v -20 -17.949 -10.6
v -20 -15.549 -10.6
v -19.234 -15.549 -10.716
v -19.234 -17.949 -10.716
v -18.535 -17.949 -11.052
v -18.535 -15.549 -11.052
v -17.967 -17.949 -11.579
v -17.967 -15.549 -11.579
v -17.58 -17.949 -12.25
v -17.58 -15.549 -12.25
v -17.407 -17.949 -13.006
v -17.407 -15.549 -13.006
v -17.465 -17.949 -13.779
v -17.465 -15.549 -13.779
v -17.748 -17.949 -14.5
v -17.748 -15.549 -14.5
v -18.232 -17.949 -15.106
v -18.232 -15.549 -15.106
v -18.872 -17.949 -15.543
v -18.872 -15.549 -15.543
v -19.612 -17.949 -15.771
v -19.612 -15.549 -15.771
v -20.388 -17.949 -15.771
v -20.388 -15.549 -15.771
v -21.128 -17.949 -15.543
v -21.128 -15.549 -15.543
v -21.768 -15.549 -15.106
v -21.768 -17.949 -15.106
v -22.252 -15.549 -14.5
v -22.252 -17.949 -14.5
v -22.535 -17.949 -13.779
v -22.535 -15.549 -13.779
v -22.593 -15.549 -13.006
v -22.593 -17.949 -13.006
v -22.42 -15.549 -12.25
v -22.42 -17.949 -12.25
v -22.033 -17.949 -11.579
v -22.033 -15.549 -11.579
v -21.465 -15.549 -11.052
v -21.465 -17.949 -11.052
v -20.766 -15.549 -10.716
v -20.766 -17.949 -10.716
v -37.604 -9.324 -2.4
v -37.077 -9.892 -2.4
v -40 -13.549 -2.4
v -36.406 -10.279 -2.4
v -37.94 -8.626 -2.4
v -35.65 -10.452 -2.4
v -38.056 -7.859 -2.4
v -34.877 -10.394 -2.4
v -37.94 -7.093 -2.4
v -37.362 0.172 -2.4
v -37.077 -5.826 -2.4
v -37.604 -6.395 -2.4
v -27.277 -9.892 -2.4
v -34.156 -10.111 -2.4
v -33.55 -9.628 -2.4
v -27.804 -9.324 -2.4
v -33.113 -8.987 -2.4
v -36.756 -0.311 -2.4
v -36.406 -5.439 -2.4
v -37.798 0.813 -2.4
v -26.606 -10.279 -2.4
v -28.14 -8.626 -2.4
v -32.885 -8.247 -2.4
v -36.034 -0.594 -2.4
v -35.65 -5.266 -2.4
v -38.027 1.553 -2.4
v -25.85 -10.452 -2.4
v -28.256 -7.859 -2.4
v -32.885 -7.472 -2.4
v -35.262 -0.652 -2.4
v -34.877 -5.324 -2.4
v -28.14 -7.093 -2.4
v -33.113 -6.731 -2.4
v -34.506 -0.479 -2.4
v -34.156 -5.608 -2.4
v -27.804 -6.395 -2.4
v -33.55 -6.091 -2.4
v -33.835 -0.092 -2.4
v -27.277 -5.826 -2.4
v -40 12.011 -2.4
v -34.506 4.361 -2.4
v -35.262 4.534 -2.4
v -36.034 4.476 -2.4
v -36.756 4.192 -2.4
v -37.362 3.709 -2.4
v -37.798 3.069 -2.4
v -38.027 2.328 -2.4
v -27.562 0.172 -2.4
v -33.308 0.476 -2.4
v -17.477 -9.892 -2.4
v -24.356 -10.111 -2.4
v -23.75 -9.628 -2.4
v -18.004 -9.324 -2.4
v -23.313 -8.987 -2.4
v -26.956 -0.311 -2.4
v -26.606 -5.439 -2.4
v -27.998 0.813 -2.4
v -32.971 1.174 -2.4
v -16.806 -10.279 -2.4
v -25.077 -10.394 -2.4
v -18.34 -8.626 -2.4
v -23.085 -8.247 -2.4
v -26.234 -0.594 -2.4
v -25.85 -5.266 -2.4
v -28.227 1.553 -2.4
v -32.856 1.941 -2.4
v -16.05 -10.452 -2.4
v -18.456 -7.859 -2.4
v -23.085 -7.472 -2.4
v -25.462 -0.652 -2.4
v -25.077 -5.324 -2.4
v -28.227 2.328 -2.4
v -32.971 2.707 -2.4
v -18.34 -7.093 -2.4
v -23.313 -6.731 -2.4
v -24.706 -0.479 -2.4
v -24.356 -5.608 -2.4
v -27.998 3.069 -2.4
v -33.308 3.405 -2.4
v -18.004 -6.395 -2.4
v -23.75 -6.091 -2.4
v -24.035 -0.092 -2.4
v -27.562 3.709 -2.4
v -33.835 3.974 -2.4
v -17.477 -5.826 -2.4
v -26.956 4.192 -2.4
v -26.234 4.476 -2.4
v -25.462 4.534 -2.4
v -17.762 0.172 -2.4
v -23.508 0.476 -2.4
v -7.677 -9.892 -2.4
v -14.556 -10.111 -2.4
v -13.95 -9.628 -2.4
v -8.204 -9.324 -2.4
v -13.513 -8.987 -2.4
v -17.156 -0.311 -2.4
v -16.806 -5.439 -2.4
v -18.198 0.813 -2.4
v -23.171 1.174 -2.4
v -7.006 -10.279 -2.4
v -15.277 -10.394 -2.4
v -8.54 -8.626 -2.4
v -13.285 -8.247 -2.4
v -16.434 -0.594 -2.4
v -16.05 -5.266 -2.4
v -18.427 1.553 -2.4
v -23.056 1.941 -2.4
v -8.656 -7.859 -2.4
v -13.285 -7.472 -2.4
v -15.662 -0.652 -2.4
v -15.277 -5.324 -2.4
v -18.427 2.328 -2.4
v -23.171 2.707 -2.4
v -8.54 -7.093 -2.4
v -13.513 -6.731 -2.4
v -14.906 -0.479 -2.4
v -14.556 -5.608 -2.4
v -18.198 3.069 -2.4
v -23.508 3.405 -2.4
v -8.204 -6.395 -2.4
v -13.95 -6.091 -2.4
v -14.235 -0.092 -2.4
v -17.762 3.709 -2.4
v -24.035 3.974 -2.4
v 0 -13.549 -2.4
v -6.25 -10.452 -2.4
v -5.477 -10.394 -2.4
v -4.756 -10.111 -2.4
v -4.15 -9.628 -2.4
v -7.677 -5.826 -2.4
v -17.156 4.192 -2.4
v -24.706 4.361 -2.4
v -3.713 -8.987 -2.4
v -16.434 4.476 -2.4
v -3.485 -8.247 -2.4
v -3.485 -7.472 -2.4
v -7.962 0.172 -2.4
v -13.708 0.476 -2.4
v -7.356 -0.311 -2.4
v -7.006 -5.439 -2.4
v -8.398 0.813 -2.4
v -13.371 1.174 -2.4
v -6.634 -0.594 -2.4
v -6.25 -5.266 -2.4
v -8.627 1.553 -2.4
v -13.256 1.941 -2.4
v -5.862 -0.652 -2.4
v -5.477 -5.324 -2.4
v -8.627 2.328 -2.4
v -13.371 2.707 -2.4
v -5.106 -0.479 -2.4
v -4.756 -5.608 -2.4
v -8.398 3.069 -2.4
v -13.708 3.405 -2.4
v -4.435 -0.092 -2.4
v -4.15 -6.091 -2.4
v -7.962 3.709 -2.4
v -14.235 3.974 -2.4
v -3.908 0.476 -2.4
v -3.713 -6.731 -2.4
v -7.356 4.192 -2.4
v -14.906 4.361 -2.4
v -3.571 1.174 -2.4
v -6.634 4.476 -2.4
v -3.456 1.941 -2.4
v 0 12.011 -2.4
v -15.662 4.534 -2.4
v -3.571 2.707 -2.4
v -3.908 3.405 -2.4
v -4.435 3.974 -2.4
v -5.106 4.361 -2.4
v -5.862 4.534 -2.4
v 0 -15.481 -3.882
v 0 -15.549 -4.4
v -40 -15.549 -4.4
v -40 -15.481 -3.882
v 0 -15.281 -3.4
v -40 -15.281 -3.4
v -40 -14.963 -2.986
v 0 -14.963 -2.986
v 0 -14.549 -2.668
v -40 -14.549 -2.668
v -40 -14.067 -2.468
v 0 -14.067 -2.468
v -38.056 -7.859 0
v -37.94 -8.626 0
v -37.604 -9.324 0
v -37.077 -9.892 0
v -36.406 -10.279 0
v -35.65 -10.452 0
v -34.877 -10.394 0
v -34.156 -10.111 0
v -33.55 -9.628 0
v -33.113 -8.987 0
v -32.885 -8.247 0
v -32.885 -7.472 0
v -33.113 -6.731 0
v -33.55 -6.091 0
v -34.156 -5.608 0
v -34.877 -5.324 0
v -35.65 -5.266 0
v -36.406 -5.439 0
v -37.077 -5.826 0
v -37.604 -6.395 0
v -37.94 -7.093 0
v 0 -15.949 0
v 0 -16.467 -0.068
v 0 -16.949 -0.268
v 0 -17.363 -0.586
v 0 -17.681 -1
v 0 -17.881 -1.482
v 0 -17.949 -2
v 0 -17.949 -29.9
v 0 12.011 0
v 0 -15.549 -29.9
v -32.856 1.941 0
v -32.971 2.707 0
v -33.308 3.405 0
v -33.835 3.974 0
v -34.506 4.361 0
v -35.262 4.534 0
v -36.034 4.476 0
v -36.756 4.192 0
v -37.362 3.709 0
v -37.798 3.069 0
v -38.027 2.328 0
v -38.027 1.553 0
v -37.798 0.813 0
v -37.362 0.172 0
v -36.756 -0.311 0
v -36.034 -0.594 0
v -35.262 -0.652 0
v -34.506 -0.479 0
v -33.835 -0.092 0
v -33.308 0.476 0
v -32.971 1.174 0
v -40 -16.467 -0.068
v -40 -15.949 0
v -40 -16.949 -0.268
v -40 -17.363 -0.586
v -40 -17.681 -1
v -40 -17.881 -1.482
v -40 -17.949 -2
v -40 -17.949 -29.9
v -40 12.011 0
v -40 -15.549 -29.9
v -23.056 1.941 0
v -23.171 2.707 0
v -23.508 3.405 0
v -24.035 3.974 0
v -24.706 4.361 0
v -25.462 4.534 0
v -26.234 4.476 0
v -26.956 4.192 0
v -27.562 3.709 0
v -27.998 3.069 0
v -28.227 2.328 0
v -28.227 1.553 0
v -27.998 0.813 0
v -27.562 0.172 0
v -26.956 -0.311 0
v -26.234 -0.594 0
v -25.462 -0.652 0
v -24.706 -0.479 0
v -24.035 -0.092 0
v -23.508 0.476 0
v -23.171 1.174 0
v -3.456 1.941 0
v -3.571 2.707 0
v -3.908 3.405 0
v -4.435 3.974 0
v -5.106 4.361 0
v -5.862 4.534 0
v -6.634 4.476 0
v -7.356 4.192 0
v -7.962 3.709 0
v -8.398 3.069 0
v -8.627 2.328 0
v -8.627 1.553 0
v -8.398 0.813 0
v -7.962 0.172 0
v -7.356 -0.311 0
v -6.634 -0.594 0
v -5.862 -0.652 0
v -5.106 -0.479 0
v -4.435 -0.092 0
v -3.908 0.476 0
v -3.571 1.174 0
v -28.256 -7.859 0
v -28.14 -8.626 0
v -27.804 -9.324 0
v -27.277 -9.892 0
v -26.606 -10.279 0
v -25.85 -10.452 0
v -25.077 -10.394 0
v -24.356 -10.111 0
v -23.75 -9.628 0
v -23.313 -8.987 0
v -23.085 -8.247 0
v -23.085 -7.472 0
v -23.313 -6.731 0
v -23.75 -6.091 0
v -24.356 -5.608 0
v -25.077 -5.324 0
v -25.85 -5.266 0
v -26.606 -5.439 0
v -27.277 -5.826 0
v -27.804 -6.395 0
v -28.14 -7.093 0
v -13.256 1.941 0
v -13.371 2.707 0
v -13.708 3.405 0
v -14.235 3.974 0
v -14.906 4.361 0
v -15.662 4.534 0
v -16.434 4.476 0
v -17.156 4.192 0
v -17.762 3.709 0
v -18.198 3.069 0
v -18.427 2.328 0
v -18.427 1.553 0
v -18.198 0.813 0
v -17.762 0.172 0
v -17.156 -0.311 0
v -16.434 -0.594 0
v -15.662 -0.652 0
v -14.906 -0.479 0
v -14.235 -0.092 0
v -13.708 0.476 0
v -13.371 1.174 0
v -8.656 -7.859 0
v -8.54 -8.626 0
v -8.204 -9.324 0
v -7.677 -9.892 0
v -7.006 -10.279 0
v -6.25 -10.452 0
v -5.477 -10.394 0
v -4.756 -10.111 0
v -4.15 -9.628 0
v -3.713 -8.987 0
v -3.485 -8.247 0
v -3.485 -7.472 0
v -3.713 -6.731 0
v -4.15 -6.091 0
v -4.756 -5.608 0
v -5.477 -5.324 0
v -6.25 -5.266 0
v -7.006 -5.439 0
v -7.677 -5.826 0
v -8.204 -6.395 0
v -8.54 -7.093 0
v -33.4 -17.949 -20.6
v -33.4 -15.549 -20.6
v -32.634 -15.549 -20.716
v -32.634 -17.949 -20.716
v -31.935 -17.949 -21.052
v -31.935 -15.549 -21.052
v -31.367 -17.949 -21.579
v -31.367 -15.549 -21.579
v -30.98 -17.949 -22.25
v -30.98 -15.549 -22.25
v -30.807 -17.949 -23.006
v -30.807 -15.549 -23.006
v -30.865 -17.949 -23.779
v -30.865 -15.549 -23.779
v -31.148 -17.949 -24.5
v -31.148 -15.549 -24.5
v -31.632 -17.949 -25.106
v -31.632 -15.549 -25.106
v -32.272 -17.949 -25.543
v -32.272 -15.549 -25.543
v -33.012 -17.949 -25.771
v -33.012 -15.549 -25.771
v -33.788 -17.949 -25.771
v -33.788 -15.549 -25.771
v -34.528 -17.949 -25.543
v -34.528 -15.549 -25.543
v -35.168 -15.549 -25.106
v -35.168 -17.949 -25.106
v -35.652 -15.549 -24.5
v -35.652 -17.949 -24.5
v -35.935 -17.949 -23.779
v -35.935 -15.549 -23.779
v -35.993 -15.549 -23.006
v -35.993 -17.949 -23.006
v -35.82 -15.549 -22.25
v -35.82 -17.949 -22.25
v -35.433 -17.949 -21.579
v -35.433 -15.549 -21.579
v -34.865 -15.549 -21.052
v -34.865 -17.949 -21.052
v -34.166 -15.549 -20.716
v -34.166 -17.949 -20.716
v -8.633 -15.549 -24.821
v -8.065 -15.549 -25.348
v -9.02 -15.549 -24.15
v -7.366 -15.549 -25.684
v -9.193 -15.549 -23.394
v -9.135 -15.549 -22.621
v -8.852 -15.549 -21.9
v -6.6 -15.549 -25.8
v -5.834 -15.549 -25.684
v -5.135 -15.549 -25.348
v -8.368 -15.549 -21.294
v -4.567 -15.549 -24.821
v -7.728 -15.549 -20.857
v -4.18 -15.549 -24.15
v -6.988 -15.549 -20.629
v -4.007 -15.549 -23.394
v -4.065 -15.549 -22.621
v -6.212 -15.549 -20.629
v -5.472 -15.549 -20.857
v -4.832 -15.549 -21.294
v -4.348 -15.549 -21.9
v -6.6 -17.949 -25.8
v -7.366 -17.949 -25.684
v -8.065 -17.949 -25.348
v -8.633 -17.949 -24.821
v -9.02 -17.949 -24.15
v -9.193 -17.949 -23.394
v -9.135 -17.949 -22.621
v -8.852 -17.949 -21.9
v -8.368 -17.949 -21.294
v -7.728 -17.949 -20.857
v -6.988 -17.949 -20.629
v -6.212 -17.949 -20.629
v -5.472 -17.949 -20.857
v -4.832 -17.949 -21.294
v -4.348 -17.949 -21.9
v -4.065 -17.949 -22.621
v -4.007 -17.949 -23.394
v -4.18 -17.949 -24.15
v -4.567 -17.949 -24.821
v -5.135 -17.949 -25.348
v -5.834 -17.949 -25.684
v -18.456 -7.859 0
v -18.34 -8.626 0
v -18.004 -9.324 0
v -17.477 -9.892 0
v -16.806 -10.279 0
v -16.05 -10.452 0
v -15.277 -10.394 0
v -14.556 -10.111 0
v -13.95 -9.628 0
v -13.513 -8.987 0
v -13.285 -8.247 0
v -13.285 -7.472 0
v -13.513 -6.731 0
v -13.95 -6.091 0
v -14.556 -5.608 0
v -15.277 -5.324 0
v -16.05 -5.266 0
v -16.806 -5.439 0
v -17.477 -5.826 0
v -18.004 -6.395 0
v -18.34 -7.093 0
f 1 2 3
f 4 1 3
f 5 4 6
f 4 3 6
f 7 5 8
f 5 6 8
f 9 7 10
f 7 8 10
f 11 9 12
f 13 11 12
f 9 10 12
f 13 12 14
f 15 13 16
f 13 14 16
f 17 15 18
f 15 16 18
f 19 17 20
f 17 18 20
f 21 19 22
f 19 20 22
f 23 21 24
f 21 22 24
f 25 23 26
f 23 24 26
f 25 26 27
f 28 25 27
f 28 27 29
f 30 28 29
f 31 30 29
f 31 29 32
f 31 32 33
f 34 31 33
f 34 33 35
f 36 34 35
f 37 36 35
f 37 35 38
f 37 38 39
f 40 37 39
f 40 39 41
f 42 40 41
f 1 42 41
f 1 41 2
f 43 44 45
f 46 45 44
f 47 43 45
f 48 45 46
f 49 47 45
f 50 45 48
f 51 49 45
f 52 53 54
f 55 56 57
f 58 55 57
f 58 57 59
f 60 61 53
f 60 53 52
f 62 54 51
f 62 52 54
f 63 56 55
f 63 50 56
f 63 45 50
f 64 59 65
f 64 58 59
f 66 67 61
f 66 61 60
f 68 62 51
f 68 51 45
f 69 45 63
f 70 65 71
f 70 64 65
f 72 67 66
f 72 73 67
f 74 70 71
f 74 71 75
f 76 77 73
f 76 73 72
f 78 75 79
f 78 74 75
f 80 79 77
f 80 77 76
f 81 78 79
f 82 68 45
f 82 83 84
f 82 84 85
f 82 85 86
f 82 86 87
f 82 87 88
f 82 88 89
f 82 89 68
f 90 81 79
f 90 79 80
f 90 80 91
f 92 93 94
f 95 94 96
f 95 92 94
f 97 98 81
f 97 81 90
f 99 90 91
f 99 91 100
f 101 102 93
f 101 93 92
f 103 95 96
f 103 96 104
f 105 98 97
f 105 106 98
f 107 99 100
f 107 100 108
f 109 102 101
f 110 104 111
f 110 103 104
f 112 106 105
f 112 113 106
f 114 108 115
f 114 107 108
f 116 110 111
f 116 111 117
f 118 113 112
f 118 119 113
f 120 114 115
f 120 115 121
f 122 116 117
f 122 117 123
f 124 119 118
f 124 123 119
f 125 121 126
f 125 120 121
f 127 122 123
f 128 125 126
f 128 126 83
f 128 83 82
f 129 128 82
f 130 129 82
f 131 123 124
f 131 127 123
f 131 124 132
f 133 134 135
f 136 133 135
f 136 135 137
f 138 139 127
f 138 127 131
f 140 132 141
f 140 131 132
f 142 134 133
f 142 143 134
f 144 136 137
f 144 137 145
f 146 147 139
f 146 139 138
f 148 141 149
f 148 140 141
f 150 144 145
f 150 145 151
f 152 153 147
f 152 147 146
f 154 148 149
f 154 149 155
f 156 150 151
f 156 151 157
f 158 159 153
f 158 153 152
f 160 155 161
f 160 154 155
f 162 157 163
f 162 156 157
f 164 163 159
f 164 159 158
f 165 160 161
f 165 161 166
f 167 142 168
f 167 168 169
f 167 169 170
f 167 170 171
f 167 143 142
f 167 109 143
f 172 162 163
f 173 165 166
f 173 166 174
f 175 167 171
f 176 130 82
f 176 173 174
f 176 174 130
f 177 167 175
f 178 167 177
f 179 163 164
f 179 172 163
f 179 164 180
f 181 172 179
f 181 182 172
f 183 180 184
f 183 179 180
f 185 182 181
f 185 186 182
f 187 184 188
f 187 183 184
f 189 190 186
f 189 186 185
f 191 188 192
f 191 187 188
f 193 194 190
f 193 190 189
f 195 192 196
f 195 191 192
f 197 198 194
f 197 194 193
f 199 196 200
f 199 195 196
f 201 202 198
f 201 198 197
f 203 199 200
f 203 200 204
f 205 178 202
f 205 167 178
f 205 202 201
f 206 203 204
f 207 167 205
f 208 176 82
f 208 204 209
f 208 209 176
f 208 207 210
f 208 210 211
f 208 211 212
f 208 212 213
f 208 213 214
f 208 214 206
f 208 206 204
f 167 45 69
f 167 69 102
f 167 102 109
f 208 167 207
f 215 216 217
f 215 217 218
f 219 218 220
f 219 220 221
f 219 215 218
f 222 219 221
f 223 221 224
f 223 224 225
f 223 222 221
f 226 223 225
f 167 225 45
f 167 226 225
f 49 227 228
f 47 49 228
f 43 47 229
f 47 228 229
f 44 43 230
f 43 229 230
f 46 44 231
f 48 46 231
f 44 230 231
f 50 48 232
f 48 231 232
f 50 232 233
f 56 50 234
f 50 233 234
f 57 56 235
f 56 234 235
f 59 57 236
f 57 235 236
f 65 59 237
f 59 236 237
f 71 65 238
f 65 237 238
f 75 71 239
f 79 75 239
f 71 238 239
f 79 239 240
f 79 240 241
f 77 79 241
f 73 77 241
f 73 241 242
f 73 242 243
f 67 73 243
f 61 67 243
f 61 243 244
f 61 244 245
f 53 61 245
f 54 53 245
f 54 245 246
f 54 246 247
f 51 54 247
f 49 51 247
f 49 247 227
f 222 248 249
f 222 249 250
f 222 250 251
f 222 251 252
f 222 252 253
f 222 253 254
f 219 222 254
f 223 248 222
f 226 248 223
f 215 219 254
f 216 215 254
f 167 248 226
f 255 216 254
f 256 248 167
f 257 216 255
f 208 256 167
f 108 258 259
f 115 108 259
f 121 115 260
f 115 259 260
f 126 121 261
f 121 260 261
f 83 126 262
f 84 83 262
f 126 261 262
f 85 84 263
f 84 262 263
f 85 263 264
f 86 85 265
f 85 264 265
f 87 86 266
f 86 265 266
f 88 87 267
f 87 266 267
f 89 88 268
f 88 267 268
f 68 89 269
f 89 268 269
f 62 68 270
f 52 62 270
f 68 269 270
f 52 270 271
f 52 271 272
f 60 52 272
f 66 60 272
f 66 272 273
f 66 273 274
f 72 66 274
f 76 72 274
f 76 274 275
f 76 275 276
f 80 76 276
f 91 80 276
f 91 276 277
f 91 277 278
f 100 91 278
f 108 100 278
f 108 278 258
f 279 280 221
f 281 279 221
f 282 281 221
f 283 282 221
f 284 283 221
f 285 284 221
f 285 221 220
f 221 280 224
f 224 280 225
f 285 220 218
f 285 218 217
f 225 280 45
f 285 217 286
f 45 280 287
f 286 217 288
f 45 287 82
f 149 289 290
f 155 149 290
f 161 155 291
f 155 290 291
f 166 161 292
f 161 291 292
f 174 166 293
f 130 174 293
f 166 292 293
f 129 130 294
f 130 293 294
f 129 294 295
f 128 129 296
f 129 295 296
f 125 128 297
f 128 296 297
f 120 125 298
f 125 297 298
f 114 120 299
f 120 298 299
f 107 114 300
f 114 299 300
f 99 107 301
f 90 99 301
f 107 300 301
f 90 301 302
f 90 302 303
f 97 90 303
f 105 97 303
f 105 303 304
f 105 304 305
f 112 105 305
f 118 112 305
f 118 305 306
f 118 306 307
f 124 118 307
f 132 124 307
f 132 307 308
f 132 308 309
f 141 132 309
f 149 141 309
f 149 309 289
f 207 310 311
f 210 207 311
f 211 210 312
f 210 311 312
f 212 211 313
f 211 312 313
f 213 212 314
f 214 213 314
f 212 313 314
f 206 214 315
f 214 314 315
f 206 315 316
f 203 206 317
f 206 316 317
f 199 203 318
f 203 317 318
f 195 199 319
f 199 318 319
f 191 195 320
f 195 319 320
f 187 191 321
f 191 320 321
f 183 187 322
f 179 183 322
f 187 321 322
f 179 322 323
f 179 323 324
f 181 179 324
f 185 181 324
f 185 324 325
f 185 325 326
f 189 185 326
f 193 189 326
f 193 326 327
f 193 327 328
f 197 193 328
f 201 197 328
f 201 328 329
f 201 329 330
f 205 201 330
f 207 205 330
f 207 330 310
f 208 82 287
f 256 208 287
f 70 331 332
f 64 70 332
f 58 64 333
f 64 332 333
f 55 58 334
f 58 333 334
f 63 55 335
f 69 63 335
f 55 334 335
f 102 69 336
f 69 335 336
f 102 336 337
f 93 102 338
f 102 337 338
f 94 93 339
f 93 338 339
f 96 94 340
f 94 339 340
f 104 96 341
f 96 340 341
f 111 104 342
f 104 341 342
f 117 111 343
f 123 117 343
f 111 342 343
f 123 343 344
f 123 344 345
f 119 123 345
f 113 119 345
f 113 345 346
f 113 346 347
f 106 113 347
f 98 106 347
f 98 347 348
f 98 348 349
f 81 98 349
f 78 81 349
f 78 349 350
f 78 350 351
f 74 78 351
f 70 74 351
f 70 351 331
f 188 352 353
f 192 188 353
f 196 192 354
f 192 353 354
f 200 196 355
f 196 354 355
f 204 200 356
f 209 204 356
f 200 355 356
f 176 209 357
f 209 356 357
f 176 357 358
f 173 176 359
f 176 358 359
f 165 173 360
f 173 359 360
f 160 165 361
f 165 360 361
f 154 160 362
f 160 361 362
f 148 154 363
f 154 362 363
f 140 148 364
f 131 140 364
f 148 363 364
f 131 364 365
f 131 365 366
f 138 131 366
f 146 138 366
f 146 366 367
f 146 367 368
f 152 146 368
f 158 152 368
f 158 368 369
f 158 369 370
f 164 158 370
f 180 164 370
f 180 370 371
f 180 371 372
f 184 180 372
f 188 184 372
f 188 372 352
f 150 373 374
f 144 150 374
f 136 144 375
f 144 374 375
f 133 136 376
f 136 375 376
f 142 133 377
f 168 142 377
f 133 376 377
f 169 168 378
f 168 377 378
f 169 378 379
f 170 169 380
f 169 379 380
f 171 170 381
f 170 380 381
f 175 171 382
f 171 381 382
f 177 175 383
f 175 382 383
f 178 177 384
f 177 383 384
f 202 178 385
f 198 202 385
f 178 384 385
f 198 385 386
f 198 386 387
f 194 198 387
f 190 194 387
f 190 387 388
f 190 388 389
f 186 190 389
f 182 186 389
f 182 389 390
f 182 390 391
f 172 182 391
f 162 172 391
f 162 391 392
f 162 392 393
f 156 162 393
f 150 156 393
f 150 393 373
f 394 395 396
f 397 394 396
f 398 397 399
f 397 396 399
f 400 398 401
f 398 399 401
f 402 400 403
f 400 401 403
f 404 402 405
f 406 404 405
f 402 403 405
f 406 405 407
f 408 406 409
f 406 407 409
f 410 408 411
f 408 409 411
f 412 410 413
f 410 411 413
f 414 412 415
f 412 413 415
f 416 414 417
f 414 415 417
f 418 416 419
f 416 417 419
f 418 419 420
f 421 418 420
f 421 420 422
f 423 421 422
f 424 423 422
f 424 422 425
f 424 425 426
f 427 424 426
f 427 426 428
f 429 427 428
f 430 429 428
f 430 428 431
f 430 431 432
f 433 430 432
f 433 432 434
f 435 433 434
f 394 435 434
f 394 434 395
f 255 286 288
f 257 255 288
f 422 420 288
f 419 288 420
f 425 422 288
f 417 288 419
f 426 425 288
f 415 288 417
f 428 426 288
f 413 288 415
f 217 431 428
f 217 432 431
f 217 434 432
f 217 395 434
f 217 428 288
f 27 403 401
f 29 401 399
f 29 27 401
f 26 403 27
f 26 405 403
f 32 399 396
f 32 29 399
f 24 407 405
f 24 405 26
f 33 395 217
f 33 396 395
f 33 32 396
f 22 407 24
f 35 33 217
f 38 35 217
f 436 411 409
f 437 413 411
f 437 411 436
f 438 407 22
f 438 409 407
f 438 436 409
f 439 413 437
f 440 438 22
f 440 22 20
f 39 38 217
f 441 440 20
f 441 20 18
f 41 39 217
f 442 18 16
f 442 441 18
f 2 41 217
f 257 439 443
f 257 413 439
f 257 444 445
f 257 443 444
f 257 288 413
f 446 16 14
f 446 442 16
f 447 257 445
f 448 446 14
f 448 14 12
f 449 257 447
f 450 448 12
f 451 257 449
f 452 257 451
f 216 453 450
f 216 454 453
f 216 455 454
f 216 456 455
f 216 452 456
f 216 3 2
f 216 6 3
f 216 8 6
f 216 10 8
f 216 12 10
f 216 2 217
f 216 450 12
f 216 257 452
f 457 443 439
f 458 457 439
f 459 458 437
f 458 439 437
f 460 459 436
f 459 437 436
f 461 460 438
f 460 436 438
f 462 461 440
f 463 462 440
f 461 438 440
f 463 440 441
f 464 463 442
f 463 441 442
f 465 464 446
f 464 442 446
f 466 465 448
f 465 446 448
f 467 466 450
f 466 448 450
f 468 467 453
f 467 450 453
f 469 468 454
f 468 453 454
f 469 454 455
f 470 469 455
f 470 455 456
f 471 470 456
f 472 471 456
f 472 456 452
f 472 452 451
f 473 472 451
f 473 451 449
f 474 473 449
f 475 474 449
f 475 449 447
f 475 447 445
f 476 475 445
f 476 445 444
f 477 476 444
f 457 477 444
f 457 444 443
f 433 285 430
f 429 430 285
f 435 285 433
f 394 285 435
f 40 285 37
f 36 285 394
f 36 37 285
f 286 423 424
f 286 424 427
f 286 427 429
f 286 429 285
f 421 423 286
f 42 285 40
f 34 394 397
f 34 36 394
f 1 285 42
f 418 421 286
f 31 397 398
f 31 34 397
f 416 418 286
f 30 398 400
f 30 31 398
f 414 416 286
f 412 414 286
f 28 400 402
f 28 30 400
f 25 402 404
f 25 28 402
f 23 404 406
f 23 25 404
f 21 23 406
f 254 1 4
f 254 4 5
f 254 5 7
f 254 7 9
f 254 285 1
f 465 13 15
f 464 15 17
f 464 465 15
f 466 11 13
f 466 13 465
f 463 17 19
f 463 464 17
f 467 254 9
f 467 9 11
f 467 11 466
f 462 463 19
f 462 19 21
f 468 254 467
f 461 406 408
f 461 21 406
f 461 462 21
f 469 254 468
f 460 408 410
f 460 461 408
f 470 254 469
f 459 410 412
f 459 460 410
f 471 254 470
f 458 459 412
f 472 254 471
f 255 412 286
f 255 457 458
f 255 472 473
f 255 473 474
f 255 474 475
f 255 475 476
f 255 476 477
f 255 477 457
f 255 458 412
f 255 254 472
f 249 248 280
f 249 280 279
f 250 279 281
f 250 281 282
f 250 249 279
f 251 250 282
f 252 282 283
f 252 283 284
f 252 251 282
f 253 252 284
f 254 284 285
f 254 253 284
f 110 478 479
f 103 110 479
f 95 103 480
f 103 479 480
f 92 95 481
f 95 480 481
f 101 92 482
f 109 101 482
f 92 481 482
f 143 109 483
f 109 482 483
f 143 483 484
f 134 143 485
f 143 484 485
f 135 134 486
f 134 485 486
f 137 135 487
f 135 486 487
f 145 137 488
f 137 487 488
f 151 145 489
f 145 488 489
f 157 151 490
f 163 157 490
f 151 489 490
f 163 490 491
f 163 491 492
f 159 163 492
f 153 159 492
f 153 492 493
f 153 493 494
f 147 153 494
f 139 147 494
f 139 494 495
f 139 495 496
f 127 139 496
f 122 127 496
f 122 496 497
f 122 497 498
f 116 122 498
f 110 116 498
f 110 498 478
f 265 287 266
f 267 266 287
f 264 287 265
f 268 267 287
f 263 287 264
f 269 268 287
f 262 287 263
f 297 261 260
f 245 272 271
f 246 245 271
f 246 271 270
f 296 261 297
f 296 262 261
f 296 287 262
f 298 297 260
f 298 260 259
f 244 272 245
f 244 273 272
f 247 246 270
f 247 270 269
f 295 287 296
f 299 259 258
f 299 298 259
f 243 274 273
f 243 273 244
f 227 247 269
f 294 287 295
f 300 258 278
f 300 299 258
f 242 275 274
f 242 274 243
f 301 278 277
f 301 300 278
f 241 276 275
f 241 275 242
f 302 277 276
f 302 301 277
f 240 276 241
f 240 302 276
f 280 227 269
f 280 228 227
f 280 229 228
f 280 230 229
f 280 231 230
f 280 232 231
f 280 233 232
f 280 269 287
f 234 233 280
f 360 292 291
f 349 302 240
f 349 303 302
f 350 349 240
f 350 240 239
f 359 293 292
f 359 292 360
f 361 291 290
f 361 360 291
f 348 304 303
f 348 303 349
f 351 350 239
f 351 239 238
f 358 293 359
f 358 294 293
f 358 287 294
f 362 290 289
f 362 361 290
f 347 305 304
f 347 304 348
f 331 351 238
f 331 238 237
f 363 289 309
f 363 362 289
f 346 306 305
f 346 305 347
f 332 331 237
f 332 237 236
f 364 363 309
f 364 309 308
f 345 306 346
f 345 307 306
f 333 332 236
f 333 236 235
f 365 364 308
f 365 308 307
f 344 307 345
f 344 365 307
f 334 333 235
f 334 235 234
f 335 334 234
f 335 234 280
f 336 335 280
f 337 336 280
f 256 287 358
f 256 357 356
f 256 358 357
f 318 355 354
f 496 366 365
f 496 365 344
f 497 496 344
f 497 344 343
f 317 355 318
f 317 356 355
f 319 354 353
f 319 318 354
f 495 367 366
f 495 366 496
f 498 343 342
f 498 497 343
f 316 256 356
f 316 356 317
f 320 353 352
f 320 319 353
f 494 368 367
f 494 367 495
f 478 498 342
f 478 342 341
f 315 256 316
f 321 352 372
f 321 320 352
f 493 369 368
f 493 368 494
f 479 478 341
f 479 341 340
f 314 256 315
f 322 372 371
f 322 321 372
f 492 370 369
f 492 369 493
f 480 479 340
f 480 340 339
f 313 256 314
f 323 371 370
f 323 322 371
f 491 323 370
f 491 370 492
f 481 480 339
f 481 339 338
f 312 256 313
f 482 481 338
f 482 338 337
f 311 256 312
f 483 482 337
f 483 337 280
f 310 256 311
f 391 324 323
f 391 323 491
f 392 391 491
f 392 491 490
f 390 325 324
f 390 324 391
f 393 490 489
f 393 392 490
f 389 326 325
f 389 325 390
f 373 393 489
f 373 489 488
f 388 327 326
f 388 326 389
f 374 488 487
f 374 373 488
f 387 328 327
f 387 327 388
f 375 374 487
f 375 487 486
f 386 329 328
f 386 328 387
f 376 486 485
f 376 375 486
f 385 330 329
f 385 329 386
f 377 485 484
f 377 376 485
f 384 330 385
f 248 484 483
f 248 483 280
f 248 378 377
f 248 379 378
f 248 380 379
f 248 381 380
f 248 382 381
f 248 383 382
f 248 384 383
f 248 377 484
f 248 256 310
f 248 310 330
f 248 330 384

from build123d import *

# Parameters (mm, degrees)
BOSS_EXTRUDE2_DEPTH = 40
SKETCH1_R           = 2.6
CUT_EXTRUDE4_DEPTH  = 40
SKETCH5_R           = 2.6
CUT_EXTRUDE5_DEPTH  = 40


with BuildPart() as part:
    # Sketch3 → Boss-Extrude2 (new body)
    with BuildSketch(Plane(origin=(0, 0, 0), x_dir=(0, 0, -1), z_dir=(1, 0, 0))):
        with BuildLine():
            Line((2, -17.949216757), (29.9, -17.949216757))
            Line((29.9, -17.949216757), (29.9, -15.549216757))
            Line((29.9, -15.549216757), (4.4, -15.549216757))
            ThreePointArc((4.4, -15.549216757), (2.985786438, -14.963430319), (2.4, -13.549216757))
            Line((2.4, -13.549216757), (2.4, 12.010783243))
            Line((2.4, 12.010783243), (0, 12.010783243))
            Line((0, 12.010783243), (0, -15.949216757))
            ThreePointArc((0, -15.949216757), (0.585786438, -17.363430319), (2, -17.949216757))
        make_face()
    extrude(amount=-BOSS_EXTRUDE2_DEPTH)

    # Sketch1 → Cut-Extrude4 (cut)
    with BuildSketch(Plane.XY):
        with Locations((-35.455799348, 1.940783243)):
            Circle(SKETCH1_R)
        with Locations((-25.655799348, 1.940783243)):
            Circle(SKETCH1_R)
        with Locations((-15.855799348, 1.940783243)):
            Circle(SKETCH1_R)
        with Locations((-6.055799348, 1.940783243)):
            Circle(SKETCH1_R)
        with Locations(Location((-6.055799348, -7.859216757, 0), (0, 0, 180))):  # turned: the seam where the file's is
            Circle(SKETCH1_R)
        with Locations(Location((-15.855799348, -7.859216757, 0), (0, 0, 180))):  # turned: the seam where the file's is
            Circle(SKETCH1_R)
        with Locations(Location((-25.655799348, -7.859216757, 0), (0, 0, 180))):  # turned: the seam where the file's is
            Circle(SKETCH1_R)
        with Locations(Location((-35.455799348, -7.859216757, 0), (0, 0, 180))):  # turned: the seam where the file's is
            Circle(SKETCH1_R)
    extrude(amount=-CUT_EXTRUDE4_DEPTH, mode=Mode.SUBTRACT)

    # Sketch5 → Cut-Extrude5 (cut)
    with BuildSketch(Plane(origin=(0, -15.549216757, 0), x_dir=(1, 0, 0), z_dir=(0, 1, 0))):
        with Locations(Location((-33.4, 23.2, 0), (0, 0, 270))):  # turned: the seam where the file's is
            Circle(SKETCH5_R)
        with Locations(Location((-6.6, 23.2, 0), (0, 0, 90))):  # turned: the seam where the file's is
            Circle(SKETCH5_R)
        with Locations(Location((-20, 13.2, 0), (0, 0, 270))):  # turned: the seam where the file's is
            Circle(SKETCH5_R)
    extrude(amount=-CUT_EXTRUDE5_DEPTH, mode=Mode.SUBTRACT)


solid = part.part
